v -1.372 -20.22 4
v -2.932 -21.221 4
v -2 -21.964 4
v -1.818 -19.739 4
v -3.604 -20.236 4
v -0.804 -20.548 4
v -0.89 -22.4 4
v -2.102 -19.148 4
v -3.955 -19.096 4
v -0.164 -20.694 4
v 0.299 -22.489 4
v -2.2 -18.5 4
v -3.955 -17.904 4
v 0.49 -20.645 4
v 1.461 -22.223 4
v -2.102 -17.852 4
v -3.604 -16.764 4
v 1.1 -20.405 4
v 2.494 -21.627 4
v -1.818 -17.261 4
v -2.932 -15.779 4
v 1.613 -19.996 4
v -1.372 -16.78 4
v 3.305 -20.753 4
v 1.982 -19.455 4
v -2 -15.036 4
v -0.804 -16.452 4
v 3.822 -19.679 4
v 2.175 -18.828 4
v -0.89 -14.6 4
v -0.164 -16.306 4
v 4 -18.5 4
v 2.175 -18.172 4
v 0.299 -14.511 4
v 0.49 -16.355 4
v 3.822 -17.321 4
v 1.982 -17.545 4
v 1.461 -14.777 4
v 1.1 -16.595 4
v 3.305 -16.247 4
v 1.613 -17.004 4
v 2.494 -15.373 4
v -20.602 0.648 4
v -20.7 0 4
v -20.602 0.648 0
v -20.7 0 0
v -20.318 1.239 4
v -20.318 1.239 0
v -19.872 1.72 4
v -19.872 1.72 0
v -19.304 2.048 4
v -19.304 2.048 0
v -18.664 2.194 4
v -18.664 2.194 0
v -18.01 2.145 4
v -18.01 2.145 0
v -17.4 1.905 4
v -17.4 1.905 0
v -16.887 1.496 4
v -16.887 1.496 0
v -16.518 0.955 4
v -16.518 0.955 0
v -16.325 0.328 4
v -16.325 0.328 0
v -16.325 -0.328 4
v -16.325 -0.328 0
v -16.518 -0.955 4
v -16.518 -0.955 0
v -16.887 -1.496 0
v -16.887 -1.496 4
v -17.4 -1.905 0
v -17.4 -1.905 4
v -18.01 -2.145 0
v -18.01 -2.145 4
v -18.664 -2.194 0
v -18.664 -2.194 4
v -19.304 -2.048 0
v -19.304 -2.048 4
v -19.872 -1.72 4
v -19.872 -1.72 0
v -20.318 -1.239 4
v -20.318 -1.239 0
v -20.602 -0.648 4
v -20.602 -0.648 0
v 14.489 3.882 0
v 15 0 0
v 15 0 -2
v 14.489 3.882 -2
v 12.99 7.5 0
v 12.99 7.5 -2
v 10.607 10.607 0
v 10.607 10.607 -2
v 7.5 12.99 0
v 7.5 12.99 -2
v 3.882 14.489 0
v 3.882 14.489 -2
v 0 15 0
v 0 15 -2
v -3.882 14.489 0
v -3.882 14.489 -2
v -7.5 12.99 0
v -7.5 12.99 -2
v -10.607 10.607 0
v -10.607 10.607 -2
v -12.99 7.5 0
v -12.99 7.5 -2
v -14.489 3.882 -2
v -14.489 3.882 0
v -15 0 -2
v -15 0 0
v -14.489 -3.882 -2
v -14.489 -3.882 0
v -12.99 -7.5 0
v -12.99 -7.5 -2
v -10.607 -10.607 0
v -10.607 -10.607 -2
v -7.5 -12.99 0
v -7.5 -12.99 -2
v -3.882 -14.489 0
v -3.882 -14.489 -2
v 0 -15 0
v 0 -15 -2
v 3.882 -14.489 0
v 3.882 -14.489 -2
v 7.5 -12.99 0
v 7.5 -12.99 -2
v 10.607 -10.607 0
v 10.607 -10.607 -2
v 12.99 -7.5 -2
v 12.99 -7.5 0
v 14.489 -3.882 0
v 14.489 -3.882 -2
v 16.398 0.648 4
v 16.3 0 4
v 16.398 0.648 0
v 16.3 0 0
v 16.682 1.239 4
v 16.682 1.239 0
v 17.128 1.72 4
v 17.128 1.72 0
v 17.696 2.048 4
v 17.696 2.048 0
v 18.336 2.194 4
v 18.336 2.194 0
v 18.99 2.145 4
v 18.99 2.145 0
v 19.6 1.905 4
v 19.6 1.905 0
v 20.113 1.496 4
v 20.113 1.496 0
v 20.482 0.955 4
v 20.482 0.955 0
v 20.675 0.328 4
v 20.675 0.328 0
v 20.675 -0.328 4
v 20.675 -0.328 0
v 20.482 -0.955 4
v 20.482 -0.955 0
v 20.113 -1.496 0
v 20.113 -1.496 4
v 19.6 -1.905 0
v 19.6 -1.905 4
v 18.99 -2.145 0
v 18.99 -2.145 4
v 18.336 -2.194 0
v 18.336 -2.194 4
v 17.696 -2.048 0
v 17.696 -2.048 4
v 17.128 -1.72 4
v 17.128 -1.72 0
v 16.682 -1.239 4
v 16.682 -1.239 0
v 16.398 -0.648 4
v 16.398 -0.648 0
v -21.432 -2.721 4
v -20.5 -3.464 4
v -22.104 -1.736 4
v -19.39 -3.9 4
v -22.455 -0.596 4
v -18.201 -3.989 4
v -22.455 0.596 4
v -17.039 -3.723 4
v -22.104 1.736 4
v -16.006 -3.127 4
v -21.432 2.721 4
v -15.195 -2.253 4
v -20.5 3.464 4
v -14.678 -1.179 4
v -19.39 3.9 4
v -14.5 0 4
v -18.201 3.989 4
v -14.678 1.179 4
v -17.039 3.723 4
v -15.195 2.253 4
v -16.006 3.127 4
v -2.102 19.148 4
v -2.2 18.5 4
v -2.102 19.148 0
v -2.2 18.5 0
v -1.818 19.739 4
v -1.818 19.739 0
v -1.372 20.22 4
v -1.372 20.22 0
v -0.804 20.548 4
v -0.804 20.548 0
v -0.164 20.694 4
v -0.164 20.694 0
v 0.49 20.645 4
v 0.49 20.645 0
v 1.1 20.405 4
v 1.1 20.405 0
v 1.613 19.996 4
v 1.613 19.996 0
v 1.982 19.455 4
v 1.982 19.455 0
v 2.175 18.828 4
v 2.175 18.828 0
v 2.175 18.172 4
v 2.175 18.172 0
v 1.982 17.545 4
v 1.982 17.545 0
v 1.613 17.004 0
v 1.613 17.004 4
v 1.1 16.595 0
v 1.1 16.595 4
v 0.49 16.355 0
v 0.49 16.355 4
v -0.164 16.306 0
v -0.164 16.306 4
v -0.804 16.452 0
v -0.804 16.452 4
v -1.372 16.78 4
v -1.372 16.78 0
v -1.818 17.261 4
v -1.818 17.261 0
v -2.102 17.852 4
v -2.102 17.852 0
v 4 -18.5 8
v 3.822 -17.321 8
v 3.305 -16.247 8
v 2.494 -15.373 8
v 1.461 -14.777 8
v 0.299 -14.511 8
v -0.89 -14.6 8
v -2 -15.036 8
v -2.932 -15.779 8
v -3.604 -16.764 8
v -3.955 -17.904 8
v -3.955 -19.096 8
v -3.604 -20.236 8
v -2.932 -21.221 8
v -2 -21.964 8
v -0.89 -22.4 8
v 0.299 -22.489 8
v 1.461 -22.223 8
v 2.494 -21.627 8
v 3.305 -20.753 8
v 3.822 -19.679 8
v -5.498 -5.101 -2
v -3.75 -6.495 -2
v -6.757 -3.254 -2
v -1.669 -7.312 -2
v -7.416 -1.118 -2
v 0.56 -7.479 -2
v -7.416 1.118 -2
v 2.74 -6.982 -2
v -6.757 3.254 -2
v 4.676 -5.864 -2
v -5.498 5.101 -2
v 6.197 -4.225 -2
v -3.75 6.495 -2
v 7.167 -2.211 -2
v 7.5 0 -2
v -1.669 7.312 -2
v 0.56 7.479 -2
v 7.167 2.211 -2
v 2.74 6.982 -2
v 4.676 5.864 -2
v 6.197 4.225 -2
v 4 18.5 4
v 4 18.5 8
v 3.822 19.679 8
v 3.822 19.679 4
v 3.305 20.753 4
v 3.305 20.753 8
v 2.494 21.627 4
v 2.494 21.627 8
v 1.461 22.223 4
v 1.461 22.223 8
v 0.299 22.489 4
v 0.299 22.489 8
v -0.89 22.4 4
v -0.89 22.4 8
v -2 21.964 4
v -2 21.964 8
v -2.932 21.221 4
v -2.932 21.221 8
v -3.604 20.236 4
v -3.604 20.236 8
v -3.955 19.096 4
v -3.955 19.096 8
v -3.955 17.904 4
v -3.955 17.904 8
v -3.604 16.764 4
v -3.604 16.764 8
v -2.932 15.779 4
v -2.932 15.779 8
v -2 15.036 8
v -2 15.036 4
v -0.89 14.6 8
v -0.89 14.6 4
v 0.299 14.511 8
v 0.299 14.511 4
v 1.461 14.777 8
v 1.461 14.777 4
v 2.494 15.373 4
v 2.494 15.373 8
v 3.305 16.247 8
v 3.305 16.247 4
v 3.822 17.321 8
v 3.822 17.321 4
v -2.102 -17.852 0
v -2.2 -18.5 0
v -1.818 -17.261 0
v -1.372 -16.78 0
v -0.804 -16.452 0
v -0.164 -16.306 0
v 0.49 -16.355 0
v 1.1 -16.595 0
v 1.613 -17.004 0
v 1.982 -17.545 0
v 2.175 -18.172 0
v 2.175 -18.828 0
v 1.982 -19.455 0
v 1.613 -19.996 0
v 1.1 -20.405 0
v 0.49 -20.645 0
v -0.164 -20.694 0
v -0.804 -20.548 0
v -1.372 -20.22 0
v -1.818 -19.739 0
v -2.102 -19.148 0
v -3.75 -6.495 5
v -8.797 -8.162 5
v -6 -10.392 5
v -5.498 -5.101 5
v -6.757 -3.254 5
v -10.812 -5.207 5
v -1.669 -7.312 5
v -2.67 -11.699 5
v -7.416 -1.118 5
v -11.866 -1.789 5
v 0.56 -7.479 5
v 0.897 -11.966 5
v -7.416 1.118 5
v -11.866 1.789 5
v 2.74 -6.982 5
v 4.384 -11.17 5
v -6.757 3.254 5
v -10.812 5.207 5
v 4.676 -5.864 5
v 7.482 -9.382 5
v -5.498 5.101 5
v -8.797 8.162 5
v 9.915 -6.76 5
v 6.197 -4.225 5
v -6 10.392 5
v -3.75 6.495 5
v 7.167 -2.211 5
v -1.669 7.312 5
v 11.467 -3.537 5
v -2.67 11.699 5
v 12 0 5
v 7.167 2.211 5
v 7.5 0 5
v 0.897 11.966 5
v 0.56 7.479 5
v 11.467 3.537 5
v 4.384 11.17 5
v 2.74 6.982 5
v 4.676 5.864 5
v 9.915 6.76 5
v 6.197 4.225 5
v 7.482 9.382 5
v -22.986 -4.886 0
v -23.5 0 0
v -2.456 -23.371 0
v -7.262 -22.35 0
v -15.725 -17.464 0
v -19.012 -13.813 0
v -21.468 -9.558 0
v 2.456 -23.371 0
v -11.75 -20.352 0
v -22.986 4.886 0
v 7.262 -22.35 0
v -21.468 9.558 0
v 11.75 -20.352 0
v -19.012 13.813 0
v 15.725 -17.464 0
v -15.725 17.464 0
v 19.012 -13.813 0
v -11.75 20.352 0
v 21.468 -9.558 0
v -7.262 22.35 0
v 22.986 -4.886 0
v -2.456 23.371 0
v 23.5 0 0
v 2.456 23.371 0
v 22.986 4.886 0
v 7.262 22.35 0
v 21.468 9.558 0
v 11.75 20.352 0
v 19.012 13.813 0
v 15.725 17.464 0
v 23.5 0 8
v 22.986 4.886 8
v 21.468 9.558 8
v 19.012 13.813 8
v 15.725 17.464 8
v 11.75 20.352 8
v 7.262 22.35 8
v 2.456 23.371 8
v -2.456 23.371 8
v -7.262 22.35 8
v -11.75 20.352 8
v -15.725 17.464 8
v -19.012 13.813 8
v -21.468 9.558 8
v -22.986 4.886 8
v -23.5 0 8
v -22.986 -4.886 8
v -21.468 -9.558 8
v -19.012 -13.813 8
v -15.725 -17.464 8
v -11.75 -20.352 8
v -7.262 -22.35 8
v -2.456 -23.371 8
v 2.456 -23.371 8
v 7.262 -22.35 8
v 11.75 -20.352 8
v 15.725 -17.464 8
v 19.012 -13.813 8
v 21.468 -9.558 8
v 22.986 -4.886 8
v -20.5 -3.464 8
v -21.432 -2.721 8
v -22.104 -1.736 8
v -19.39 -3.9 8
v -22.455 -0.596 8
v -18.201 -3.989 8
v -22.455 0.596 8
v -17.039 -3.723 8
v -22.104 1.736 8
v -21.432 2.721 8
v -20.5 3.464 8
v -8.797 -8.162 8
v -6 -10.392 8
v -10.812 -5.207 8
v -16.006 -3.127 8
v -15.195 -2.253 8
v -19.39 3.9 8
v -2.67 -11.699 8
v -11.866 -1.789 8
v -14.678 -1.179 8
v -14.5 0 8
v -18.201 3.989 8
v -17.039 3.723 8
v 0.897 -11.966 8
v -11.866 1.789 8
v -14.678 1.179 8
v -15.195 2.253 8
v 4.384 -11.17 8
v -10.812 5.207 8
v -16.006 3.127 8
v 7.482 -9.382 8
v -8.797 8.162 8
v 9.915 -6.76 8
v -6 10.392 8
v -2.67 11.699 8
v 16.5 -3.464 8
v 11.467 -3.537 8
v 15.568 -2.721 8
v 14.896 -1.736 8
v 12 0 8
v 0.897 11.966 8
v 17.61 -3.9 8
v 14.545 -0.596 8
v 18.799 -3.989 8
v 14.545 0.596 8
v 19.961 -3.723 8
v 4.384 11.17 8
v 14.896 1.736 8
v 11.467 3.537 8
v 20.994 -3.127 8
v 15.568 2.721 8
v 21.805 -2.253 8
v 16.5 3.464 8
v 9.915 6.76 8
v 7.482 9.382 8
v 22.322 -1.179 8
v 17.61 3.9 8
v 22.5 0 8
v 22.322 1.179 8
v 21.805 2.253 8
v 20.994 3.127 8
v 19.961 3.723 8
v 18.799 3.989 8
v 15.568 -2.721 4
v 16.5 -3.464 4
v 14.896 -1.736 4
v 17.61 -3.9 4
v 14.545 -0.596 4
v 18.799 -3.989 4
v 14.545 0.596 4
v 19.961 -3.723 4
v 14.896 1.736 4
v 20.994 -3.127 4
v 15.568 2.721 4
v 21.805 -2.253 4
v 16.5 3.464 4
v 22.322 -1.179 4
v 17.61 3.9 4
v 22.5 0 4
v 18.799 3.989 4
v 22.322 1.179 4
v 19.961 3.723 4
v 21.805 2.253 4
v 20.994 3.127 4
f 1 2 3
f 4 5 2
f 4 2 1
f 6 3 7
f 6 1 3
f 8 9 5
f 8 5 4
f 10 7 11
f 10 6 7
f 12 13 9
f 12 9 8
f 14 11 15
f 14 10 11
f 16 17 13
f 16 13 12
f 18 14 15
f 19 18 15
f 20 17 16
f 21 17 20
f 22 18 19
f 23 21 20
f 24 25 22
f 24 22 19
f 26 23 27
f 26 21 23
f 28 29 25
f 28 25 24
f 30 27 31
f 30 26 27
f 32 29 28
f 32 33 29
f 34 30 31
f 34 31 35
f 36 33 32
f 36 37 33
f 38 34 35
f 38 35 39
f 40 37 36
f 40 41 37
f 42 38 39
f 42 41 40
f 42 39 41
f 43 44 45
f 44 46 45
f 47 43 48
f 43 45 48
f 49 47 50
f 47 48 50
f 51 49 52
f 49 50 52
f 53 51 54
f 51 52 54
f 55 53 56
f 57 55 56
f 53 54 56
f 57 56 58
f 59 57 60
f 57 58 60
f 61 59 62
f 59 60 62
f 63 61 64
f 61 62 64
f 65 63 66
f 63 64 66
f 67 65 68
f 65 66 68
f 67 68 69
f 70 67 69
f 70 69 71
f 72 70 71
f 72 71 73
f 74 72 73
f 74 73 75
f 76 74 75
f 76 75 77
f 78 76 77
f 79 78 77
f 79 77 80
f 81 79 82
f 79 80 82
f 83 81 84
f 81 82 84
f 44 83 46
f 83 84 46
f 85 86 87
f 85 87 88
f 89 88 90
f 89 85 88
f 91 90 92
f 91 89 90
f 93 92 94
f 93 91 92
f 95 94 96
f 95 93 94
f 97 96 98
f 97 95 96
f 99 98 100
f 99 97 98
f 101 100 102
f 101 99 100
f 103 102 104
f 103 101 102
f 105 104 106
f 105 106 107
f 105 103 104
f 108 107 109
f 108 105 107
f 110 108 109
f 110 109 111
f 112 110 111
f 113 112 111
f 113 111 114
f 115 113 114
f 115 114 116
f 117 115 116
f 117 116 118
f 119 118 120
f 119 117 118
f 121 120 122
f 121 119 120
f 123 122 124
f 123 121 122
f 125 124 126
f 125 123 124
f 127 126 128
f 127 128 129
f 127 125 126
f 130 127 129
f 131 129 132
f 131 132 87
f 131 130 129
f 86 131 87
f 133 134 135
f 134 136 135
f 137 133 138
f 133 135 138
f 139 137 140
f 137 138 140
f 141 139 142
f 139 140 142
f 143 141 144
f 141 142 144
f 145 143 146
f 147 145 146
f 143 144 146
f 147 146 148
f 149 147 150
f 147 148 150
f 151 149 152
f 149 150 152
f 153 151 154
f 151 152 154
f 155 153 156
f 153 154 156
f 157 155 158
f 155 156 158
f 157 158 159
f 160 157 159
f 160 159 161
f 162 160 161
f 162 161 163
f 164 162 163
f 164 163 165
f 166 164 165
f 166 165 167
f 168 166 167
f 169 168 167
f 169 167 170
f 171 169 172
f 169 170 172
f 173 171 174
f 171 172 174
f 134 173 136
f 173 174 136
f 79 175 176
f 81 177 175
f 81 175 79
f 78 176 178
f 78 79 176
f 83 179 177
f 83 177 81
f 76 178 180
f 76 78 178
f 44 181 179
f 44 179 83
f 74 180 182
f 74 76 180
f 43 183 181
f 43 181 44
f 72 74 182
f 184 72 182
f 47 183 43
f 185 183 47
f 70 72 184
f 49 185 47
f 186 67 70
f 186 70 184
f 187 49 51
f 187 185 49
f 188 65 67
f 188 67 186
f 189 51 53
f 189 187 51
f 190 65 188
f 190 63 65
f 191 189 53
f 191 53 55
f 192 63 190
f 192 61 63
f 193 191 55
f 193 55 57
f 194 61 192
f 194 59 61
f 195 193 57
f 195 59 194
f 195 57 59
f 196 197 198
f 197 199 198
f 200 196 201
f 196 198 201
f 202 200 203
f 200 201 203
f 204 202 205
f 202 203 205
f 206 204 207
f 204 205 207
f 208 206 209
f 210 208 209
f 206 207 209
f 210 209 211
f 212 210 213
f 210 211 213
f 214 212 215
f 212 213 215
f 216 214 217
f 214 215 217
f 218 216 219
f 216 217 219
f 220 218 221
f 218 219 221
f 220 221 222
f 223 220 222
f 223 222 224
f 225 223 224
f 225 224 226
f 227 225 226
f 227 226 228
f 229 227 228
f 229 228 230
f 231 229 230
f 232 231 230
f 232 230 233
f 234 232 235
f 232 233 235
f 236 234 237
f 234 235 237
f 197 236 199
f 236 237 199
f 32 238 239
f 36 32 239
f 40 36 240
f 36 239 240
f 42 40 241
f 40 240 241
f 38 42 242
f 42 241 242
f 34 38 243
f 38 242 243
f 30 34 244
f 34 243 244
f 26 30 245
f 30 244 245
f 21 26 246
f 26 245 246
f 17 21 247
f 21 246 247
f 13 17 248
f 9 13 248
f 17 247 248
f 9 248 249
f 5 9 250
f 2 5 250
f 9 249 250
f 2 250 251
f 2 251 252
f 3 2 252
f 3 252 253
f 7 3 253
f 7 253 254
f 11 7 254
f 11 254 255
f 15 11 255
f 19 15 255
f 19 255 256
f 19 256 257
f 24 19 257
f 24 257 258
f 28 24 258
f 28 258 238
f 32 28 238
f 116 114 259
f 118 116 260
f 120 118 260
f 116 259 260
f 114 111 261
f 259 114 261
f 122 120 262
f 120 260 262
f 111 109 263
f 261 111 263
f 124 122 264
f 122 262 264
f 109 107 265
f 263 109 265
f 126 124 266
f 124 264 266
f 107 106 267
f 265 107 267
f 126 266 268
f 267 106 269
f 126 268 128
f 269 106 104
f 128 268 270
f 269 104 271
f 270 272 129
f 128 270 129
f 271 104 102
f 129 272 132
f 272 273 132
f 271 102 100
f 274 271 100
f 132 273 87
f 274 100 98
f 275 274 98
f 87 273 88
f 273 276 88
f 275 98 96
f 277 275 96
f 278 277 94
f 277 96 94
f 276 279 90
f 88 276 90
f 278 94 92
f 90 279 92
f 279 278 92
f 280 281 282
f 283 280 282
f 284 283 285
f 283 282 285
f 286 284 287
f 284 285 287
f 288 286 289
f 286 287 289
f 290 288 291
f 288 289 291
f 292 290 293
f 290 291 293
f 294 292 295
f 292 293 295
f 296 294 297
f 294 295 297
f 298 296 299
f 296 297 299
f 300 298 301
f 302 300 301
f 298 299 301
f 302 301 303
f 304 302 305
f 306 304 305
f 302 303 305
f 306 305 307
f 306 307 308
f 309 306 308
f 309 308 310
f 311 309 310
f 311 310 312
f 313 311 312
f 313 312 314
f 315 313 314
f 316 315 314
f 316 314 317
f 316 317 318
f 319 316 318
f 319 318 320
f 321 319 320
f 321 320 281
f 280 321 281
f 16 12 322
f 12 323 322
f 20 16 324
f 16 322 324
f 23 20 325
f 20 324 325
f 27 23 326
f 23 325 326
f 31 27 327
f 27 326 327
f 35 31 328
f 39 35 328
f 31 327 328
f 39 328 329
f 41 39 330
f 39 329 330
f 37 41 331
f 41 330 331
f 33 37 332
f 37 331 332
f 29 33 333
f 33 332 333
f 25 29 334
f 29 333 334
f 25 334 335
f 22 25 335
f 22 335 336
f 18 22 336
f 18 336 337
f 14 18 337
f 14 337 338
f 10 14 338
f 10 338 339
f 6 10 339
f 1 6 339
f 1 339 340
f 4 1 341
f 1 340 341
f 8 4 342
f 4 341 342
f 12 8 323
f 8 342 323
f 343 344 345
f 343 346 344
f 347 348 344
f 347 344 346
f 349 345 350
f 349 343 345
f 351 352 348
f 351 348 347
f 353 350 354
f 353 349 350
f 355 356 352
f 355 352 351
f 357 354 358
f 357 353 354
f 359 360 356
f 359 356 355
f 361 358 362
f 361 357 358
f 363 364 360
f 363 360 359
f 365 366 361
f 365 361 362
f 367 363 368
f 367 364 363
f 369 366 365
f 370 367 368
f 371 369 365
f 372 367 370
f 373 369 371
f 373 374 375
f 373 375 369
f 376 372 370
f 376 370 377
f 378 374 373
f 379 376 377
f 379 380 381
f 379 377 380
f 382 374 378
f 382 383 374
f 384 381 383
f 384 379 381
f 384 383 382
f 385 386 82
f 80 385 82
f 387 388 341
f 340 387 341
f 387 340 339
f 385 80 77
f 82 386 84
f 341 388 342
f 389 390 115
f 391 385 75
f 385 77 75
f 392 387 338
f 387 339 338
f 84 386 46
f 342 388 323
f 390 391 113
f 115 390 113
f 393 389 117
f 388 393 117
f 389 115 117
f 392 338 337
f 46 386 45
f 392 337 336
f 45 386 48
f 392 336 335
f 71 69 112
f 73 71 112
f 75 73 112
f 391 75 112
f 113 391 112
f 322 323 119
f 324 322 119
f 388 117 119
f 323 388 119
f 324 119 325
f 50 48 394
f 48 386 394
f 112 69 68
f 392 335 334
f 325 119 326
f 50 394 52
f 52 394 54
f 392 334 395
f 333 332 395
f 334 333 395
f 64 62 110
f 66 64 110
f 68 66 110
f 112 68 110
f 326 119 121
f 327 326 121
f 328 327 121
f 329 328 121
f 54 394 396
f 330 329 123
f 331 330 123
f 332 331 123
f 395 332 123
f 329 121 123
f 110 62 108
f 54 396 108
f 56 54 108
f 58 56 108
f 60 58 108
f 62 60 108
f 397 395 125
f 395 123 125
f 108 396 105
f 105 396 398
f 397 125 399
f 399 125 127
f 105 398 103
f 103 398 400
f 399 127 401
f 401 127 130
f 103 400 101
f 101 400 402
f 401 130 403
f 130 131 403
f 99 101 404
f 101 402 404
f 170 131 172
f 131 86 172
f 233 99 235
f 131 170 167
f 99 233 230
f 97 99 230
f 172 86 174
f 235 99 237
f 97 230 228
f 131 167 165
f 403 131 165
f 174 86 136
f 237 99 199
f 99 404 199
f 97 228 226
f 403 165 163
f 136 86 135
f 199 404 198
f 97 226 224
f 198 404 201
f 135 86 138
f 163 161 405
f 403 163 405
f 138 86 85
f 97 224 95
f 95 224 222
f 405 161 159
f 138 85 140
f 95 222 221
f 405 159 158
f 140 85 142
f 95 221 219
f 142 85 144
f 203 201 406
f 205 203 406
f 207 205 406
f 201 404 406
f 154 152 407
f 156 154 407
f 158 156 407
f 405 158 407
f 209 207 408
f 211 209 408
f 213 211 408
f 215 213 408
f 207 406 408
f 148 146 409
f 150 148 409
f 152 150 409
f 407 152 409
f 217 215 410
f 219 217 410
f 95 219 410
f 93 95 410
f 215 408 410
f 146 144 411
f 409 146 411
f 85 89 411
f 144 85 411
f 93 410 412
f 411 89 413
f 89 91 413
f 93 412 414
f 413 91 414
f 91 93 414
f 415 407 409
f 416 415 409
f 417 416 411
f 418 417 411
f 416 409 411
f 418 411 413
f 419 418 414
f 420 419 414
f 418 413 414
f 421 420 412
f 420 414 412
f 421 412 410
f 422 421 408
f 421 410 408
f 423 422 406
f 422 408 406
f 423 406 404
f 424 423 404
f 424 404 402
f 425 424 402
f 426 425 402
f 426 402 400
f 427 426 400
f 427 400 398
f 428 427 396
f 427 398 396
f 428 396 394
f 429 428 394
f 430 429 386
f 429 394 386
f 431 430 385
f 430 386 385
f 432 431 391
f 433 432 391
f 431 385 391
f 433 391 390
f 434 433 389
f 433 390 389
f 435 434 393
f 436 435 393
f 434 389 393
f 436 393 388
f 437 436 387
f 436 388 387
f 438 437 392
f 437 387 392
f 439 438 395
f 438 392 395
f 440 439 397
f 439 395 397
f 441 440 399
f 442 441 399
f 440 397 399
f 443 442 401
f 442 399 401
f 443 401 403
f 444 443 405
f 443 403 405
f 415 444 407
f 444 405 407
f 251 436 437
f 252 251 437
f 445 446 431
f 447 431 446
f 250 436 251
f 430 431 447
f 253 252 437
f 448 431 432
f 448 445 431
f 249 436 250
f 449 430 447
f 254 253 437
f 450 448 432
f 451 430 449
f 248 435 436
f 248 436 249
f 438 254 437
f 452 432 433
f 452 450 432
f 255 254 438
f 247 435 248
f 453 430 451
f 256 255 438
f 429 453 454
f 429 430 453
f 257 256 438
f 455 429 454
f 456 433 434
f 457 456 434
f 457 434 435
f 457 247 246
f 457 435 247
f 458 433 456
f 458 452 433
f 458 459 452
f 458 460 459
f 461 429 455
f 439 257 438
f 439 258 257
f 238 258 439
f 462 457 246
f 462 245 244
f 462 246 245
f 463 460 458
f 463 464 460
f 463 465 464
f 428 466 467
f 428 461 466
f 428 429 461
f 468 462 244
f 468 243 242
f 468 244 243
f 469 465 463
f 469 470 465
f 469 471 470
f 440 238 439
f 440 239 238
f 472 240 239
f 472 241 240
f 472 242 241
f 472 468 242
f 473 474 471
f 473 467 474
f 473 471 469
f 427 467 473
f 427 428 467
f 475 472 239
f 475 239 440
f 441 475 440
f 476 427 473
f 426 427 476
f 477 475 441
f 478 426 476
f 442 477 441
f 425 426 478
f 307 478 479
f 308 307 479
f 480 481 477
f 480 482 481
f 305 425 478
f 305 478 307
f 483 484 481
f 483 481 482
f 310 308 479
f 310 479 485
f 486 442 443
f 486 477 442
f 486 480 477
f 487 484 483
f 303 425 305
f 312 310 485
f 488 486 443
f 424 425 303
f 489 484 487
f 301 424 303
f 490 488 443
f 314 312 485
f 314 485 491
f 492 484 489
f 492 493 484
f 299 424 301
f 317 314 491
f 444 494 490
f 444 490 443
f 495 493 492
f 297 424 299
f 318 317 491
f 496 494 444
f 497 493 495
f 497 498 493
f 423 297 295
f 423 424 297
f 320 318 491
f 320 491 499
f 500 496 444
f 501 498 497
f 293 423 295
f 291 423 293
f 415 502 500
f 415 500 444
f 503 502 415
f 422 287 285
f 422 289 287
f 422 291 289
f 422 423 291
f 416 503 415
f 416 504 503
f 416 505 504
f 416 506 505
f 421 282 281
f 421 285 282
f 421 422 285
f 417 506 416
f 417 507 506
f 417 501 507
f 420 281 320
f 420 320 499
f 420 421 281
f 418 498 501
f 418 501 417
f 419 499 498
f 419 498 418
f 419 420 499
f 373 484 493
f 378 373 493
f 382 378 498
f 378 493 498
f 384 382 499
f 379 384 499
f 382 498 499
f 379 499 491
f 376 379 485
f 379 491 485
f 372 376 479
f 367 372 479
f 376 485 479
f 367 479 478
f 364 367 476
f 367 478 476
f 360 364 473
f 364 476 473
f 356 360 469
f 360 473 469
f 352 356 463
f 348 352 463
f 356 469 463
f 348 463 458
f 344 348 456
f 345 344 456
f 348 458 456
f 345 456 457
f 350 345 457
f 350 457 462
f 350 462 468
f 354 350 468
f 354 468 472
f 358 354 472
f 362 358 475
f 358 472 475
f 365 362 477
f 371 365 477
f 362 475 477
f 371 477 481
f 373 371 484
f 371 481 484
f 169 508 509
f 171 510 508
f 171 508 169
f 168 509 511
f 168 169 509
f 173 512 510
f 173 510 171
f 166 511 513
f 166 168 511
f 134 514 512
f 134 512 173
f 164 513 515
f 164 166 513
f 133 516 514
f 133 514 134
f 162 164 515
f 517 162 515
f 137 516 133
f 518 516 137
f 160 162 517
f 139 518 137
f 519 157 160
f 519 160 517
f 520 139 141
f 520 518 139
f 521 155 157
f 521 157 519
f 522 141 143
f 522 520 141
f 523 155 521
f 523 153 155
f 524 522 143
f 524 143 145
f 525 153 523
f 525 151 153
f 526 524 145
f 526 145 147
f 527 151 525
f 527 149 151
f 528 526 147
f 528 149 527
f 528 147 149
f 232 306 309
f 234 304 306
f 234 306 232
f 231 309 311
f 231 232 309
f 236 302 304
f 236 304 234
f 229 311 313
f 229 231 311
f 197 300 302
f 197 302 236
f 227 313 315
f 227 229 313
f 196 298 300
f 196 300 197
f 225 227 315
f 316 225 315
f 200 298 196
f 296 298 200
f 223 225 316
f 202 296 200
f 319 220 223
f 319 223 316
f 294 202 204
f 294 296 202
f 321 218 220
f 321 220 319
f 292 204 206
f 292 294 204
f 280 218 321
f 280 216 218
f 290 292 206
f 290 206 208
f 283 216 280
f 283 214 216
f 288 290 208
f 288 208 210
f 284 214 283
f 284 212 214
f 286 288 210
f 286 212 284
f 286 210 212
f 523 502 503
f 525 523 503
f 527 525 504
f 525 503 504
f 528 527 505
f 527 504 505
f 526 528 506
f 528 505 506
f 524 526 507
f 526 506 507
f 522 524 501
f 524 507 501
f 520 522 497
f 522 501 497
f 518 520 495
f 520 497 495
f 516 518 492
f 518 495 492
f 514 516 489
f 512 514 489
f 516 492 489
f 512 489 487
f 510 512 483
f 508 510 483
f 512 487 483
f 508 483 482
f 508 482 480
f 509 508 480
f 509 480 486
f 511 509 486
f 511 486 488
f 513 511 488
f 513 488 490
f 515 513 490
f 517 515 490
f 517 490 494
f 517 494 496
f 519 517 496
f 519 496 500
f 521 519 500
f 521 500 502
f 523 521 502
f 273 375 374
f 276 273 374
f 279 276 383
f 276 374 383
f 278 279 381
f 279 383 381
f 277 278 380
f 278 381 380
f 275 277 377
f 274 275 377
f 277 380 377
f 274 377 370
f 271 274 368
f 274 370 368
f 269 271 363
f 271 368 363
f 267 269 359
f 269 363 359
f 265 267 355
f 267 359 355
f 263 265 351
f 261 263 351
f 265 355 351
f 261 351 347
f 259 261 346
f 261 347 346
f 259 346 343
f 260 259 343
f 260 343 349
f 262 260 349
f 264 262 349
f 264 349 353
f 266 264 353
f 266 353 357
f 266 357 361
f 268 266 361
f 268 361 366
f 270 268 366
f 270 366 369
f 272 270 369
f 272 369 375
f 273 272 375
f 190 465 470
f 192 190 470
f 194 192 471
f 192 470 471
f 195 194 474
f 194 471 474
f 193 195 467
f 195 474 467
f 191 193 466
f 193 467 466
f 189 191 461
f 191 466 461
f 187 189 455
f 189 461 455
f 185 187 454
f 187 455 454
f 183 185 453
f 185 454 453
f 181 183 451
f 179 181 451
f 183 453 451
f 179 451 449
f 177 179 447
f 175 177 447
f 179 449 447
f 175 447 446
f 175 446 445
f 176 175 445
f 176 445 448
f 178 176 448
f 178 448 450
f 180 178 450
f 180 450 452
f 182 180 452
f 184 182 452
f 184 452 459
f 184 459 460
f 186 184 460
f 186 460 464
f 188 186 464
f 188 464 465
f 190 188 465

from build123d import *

# Parameters (mm, degrees)
F0_R           = 15
F1_DEPTH       = 2
F2_R           = 23.5
F3_DEPTH       = 8
F4_R           = 12
F5_DEPTH       = 3
F6_R           = 7.5
F7_DEPTH       = 7.001
F9_D           = 4.4
F9_CBORE_D     = 8
F9_CBORE_DEPTH = 4


with BuildPart() as f1:
    # F0 (on Top) → F1 (new body)
    with BuildSketch(Plane.XY):
        Circle(F0_R)
    extrude(amount=-F1_DEPTH)

    # F2 (on Top) → F3 (join)
    with BuildSketch(Plane.XY):
        Circle(F2_R)
    extrude(amount=F3_DEPTH)

    # F4 (on face) → F5 (cut)
    with BuildSketch(Plane.XY.offset(8)):
        Circle(F4_R)
    extrude(amount=-F5_DEPTH, mode=Mode.SUBTRACT)

    # F6 (on face) → F7 (cut, through all)
    with BuildSketch(Plane.XY.offset(5)):
        Circle(F6_R)
    extrude(amount=-F7_DEPTH, mode=Mode.SUBTRACT)

    # F9 (through all)
    with Locations(Plane.XY.offset(8)):
        with Locations((0, 18.5), (-18.5, 0), (0, -18.5), (18.5, 0)):
            CounterBoreHole(F9_D / 2, F9_CBORE_D / 2, F9_CBORE_DEPTH)


solid = f1.part
